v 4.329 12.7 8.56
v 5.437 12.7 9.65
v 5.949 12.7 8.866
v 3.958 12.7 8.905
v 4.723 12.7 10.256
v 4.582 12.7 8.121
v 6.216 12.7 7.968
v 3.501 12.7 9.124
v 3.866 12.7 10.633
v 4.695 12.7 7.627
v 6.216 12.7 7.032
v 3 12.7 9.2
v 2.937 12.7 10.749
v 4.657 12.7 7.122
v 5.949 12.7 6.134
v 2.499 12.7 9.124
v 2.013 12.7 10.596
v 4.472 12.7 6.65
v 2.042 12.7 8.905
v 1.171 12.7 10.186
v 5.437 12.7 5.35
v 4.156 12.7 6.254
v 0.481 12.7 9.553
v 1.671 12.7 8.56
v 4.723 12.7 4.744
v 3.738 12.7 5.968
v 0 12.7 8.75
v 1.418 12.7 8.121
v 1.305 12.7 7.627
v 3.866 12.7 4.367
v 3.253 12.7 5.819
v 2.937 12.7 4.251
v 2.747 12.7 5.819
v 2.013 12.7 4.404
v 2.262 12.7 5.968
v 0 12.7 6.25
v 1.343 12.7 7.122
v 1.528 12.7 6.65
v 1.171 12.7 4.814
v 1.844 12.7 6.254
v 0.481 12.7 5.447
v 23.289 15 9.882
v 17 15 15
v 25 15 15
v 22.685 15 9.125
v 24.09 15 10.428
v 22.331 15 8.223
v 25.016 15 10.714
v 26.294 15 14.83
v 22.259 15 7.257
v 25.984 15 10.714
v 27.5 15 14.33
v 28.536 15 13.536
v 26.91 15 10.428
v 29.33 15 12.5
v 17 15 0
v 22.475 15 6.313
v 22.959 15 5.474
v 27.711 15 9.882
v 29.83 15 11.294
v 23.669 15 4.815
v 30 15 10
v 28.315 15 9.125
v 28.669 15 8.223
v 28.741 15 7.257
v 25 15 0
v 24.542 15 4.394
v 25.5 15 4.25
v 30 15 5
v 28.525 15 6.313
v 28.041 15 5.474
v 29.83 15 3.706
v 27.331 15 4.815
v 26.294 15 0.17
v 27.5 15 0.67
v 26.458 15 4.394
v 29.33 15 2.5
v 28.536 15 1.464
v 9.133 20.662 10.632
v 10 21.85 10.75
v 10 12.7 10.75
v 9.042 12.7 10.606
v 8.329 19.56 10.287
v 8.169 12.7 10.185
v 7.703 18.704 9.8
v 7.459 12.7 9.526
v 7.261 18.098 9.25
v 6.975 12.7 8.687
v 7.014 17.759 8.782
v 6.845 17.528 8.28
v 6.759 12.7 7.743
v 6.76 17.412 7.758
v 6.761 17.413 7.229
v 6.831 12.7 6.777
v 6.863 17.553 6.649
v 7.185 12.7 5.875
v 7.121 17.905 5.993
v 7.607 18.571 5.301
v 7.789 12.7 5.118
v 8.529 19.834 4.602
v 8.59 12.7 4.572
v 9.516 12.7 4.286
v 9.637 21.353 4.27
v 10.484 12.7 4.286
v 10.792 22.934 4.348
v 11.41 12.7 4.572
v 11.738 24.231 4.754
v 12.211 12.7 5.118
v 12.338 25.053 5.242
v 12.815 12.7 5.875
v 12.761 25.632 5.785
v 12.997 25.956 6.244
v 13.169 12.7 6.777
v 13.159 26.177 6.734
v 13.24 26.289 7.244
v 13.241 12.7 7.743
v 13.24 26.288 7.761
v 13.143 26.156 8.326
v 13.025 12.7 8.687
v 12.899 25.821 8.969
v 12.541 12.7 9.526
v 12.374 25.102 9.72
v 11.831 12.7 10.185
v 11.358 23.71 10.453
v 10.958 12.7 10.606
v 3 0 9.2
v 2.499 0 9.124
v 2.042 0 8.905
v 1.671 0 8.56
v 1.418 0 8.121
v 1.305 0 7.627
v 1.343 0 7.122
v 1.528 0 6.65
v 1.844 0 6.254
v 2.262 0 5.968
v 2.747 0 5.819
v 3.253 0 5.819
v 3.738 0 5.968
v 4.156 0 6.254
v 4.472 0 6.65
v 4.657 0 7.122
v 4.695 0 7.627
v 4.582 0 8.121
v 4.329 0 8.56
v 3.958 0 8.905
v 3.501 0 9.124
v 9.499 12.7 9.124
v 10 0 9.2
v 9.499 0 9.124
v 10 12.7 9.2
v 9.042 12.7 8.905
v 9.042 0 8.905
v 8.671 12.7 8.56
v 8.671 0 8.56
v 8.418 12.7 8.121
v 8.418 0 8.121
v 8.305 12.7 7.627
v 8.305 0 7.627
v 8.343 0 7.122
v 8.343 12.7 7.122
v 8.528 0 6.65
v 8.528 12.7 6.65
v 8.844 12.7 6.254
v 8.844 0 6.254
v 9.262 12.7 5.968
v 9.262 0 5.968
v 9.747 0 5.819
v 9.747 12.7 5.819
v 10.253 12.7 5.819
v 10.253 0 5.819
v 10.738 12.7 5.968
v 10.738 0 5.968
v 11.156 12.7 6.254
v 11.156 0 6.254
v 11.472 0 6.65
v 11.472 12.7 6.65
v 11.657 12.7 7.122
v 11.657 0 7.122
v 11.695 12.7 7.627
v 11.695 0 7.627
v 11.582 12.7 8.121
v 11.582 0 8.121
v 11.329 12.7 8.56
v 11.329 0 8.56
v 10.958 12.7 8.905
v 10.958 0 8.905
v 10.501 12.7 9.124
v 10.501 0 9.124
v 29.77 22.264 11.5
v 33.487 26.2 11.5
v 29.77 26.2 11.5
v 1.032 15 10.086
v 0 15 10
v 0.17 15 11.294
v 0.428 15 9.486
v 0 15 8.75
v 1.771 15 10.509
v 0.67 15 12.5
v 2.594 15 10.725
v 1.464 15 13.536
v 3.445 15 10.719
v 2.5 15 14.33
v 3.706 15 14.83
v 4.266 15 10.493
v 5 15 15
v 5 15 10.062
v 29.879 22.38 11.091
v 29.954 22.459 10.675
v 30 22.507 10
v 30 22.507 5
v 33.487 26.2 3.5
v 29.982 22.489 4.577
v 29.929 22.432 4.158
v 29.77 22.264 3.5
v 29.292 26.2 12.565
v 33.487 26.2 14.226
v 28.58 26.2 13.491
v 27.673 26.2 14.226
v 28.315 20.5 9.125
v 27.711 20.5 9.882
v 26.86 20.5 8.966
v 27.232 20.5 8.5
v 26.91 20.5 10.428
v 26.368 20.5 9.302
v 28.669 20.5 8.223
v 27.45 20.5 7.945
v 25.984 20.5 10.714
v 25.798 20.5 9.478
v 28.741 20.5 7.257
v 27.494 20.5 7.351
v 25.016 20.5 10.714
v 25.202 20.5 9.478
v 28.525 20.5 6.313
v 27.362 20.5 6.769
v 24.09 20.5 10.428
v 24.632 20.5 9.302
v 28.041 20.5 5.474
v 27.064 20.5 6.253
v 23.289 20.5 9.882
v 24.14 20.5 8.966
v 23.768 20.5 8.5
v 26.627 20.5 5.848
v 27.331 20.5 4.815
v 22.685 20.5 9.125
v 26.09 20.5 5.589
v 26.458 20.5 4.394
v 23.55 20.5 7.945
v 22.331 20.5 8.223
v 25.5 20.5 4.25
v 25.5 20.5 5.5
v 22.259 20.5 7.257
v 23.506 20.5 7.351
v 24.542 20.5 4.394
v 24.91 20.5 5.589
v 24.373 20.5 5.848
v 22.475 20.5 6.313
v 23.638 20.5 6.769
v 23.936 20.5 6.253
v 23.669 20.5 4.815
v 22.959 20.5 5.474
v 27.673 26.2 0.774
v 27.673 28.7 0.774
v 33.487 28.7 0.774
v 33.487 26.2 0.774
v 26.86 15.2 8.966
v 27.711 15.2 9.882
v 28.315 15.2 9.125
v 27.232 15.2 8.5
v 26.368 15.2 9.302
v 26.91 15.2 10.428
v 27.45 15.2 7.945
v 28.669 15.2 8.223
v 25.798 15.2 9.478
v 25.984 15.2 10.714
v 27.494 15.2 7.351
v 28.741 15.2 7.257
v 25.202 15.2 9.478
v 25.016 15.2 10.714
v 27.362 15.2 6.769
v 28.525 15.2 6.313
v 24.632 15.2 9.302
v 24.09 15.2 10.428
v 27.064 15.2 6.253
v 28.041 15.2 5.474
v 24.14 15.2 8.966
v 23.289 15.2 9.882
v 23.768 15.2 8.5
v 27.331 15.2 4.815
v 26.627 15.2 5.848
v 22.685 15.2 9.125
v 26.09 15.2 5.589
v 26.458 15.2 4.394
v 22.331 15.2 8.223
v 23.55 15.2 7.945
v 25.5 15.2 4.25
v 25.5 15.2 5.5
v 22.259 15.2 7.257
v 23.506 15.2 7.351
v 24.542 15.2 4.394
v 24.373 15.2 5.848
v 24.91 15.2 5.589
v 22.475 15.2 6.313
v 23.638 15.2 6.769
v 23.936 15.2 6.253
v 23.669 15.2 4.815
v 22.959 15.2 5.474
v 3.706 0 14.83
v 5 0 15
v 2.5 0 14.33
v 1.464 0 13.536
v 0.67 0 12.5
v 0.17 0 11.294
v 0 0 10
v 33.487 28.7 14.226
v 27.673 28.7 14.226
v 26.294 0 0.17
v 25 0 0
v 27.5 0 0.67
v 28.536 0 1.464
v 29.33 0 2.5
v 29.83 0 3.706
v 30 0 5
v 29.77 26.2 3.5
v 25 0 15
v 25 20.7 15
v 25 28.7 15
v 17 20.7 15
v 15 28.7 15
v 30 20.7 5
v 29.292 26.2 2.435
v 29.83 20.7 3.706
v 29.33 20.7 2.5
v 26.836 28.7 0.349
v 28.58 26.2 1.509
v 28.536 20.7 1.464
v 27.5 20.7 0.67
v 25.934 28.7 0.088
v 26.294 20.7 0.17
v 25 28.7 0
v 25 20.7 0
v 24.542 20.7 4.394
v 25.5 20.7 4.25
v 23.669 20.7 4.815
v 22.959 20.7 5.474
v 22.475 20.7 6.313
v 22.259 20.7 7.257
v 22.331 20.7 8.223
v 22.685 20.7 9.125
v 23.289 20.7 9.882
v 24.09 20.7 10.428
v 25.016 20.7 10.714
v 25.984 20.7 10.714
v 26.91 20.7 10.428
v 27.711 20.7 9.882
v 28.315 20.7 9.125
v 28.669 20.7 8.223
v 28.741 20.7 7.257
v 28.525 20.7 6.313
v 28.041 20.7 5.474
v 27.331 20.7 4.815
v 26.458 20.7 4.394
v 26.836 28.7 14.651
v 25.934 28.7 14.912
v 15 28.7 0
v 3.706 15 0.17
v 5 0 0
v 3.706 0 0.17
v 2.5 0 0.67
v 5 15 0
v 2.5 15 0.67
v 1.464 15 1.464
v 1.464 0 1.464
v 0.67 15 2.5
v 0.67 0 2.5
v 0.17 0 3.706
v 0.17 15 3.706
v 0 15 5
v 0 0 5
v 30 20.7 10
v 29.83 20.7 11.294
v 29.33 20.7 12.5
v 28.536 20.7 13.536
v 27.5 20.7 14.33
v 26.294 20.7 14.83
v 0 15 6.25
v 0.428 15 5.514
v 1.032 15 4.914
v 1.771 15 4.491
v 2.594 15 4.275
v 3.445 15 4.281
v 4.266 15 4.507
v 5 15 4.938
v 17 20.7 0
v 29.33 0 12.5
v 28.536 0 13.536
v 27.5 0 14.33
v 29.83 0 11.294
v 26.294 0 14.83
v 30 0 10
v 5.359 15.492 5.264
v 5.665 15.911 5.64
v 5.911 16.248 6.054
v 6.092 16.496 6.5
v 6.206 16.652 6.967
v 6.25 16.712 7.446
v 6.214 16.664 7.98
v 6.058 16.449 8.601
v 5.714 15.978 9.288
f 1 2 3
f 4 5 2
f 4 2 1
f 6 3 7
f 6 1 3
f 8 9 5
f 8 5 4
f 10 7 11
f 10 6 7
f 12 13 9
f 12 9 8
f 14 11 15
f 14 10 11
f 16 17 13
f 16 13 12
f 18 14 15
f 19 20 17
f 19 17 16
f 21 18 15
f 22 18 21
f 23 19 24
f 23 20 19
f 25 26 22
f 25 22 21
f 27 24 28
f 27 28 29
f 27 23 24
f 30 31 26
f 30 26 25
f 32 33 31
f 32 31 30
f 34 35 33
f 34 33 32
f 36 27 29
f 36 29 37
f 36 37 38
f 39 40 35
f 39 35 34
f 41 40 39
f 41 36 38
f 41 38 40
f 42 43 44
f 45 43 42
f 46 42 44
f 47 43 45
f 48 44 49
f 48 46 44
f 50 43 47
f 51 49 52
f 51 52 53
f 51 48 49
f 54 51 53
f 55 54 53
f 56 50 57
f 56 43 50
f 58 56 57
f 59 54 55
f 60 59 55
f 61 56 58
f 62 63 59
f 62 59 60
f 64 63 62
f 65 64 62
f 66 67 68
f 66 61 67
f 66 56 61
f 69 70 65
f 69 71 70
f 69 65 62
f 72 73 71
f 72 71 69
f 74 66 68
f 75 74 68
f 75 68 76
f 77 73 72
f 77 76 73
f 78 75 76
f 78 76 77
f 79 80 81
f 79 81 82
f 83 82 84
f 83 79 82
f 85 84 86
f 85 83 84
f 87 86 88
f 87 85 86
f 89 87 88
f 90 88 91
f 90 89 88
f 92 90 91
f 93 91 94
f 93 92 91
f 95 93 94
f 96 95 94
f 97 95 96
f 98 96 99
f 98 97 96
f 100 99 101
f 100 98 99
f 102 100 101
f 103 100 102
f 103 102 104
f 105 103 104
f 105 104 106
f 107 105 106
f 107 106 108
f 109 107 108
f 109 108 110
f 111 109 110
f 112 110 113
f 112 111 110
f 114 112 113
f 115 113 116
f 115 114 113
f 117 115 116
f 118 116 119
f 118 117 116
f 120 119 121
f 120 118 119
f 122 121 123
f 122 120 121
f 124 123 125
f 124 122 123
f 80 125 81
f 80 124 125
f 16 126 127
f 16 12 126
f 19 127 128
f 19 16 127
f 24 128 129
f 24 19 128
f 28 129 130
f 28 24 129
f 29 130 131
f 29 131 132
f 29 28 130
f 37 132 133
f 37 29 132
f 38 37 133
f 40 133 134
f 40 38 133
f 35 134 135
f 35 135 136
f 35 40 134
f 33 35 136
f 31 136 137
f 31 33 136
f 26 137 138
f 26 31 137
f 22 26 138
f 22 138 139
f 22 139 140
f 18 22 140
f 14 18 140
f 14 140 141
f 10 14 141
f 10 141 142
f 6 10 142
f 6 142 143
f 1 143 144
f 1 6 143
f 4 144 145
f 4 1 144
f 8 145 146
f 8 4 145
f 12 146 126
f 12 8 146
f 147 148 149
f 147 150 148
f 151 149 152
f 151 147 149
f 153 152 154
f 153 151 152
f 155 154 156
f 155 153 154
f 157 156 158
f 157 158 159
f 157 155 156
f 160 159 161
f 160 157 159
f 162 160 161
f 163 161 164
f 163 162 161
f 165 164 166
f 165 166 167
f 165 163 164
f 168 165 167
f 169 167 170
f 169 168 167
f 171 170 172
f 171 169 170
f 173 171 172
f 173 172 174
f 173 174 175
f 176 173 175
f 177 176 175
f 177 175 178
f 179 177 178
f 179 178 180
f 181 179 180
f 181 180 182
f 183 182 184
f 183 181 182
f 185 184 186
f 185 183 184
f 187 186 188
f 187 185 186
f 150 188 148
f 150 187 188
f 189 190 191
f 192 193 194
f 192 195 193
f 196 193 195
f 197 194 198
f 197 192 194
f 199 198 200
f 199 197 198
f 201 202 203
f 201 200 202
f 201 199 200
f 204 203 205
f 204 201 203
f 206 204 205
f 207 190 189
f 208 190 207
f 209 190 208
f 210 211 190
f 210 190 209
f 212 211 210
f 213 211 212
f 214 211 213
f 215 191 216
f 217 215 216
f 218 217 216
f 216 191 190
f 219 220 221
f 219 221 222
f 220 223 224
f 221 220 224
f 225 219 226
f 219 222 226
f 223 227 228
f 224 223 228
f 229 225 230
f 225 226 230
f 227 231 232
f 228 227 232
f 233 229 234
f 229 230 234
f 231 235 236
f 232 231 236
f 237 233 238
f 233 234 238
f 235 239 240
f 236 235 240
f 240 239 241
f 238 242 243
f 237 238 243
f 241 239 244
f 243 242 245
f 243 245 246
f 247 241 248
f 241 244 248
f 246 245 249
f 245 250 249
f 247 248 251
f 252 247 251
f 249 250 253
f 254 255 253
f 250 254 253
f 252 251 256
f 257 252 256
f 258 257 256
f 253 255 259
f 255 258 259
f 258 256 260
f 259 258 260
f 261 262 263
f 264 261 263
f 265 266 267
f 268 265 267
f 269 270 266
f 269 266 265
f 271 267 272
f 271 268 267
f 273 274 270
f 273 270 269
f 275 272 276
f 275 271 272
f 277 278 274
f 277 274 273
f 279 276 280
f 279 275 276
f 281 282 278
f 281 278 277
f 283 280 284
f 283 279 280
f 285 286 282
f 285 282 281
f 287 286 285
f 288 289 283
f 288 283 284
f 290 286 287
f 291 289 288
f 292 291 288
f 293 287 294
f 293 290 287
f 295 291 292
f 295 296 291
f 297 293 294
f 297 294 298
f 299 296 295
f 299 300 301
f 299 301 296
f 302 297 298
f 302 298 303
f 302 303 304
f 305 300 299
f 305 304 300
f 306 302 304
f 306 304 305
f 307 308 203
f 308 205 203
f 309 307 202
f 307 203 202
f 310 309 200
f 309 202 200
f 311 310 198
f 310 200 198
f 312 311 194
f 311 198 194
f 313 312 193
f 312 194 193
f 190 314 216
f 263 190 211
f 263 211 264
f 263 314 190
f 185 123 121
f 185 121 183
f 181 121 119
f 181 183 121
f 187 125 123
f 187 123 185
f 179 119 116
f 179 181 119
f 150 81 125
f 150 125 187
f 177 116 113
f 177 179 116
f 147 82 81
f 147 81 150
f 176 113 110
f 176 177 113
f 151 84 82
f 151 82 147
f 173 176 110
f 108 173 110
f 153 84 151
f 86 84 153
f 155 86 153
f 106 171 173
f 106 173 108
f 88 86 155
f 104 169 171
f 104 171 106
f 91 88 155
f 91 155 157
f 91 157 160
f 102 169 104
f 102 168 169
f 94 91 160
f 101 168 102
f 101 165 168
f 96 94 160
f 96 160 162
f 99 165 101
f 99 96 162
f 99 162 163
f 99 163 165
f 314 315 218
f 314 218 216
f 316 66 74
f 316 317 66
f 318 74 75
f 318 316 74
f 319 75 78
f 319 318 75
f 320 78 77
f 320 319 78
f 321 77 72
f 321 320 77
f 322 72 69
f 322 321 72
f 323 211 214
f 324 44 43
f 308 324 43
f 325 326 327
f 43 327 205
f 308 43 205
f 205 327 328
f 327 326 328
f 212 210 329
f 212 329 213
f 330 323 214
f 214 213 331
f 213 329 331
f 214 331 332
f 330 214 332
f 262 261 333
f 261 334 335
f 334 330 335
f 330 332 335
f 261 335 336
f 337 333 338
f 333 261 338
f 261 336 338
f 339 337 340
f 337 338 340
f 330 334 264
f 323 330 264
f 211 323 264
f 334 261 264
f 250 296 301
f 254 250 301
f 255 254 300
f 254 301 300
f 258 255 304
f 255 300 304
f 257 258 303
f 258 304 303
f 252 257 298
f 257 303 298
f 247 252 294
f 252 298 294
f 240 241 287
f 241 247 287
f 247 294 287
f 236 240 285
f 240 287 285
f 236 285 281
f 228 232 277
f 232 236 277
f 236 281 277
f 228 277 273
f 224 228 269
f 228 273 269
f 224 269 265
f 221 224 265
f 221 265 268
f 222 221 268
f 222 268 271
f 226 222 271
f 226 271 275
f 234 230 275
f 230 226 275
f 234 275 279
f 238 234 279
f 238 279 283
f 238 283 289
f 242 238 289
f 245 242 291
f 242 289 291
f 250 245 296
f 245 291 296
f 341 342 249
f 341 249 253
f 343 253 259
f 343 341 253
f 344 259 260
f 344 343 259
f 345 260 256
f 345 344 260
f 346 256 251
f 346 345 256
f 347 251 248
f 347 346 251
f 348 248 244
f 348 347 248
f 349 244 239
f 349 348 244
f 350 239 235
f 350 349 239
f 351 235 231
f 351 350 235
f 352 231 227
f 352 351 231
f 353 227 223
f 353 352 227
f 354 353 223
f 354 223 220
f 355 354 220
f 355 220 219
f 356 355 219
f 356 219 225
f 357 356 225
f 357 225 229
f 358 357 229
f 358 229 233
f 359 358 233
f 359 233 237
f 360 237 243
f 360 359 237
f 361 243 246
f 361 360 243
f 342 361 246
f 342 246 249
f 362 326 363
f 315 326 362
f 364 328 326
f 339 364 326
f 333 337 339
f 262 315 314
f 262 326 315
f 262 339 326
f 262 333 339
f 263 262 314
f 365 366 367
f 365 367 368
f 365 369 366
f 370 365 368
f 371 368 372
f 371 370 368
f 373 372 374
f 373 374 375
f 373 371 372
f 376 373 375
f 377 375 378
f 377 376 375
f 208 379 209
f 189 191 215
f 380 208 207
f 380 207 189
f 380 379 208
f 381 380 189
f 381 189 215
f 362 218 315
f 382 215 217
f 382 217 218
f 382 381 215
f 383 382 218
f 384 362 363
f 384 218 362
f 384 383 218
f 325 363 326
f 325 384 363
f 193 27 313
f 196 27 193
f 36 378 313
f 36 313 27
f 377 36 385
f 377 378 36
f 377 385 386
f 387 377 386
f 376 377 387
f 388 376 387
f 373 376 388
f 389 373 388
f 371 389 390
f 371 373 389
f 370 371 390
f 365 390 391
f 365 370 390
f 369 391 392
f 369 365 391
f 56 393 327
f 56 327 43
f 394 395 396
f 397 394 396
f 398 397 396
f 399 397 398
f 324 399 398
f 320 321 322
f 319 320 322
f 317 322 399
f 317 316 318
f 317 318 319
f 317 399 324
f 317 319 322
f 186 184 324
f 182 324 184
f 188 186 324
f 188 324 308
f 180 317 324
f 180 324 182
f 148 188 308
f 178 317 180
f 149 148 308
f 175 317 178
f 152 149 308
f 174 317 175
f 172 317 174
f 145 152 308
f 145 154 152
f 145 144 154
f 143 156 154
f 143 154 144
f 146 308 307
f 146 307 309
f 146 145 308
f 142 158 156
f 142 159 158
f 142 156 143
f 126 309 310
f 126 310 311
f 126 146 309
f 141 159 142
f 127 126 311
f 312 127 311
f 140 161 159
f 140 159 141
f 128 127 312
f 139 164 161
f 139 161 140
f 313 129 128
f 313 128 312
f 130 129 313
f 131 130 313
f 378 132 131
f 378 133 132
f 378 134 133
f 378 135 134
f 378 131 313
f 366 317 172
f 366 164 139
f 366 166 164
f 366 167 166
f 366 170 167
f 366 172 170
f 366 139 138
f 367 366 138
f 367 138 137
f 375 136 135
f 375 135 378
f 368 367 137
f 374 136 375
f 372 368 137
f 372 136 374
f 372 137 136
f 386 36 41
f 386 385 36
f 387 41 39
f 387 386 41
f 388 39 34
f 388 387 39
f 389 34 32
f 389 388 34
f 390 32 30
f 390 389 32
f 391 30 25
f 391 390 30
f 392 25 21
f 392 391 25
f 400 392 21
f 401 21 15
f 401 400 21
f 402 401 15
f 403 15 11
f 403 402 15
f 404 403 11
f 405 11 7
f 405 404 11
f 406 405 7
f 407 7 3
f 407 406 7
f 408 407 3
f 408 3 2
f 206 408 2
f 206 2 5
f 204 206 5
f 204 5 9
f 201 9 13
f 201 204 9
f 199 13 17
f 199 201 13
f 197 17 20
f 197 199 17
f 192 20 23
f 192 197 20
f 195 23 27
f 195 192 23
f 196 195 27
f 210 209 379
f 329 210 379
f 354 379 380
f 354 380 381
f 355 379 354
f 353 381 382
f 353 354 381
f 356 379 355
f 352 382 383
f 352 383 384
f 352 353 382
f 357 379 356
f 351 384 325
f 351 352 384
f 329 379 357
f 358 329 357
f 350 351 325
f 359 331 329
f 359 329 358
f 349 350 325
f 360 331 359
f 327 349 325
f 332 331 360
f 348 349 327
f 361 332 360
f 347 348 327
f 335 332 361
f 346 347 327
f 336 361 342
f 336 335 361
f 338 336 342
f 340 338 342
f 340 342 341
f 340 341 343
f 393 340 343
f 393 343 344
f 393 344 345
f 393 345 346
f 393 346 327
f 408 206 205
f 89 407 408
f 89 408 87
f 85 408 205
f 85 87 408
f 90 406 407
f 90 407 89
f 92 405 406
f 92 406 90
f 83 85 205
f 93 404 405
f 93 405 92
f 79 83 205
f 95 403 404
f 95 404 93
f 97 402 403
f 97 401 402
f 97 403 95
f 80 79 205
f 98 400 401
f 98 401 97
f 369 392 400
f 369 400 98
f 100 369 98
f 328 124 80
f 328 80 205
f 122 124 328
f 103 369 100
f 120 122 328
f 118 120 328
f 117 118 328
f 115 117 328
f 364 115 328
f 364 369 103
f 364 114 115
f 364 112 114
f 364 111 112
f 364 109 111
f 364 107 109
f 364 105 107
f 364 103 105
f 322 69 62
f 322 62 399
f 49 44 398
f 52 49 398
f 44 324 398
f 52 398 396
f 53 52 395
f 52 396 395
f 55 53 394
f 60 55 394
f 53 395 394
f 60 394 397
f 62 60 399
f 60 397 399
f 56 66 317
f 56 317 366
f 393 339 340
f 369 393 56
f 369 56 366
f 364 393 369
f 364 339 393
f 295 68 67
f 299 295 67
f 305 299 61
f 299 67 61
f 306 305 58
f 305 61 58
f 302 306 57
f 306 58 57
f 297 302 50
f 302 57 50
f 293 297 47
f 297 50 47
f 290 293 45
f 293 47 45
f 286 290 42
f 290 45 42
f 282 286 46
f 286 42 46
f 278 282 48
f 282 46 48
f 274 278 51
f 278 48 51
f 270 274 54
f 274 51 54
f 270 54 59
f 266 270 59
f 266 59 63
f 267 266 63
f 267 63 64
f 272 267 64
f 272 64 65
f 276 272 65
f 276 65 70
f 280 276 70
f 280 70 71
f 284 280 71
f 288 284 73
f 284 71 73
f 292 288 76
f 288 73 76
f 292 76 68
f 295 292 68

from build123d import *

# Parameters (mm, degrees)
BOSS_EXTRUDE1_DEPTH           = 15
BOSS_EXTRUDE2_REACH           = 38.742
SKETCH3_R                     = 2
SKETCH4_R                     = 3.25
BOSS_EXTRUDE3_DEPTH           = 0.2
FILLET1_R                     = 5
CBORE_FOR_M3_SHCS1_AT_2_COUNT = 2
CBORE_FOR_M3_SHCS1_AT_2_PITCH = 7
SKETCH7_W                     = 5.814312221
SKETCH7_H                     = 13.45156011
BOSS_EXTRUDE4_DEPTH           = 2.5
RIB1_REACH                    = 46.736
SKETCH9_WALL_W                = 96.550792296
SKETCH9_WALL_H                = 8


with BuildPart() as part:
    # Sketch1 → Boss-Extrude1 (new body)
    with BuildSketch(Plane.XY):
        Polygon((0, 0), (0, 15), (5, 15), (15, 28.7), (30, 28.7), (30, 20.7), (17, 20.7), (17, 15), (30, 15), (30, 0), align=None)
    extrude(amount=BOSS_EXTRUDE1_DEPTH)

    # Sketch3 → Boss-Extrude2 (add, up to next)
    with BuildSketch(Plane(origin=(0, 15, 0), x_dir=(1, 0, 0), z_dir=(0, 1, 0)), mode=Mode.PRIVATE) as boss_extrude2_sk1:
        with Locations(Location((25.5, -7.5, 0), (0, 0, 90))):
            Circle(SKETCH3_R)
    boss_extrude2_tool1 = extrude(boss_extrude2_sk1.sketch, amount=BOSS_EXTRUDE2_REACH, mode=Mode.PRIVATE) - part.part
    add(boss_extrude2_tool1.solids().sort_by_distance((25.5, 15, 7.5))[0])

    # Sketch4 → Boss-Extrude3 (add)
    with BuildSketch(Plane(origin=(0, 15, 0), x_dir=(1, 0, 0), z_dir=(0, 1, 0))):
        with Locations(Location((25.5, -7.5, 0), (0, 0, 90))):
            Circle(SKETCH4_R)
    boss_extrude3 = extrude(amount=BOSS_EXTRUDE3_DEPTH)

    # Mirror1: Boss-Extrude3 across plane
    add(boss_extrude3.mirror(Plane.ZX.offset(17.85)))

    # Fillet1
    fillet1_edges = [part.edges().sort_by_distance(p)[0] for p in [
        (0, 7.5, 0),
        (30, 24.7, 0),
        (30, 7.5, 0),
        (30, 24.7, 15),
        (0, 7.5, 15),
        (30, 7.5, 15),
    ]]
    fillet(fillet1_edges, radius=FILLET1_R)

    # Sketch6 → CBORE for M3 SHCS1 (revolve, cut)
    with BuildSketch(Plane(origin=(3, 28.7, 7.5), x_dir=(0, 0, 1), z_dir=(1, 0, 0))):
        Polygon((0, 0), (0, 28.7), (1.7, 28.7), (1.7, 16), (3.25, 16), (3.25, 0.025), (3.275, 0), align=None)
    cbore_for_m3_shcs1 = revolve(axis=Axis((3, 35.05, 7.5), (0, -1, 0)), mode=Mode.SUBTRACT)

    # CBORE for M3 SHCS1 at 2: CBORE for M3 SHCS1 ×2
    with Locations(*[(i * CBORE_FOR_M3_SHCS1_AT_2_PITCH, 0, 0) for i in range(1, CBORE_FOR_M3_SHCS1_AT_2_COUNT)]):
        add(cbore_for_m3_shcs1, mode=Mode.SUBTRACT)

    # Sketch7 → Boss-Extrude4 (add)
    with BuildSketch(Plane(origin=(0, 28.7, 0), x_dir=(1, 0, 0), z_dir=(0, 1, 0))):
        with Locations((30.579754646, -7.5)):
            Rectangle(SKETCH7_W, SKETCH7_H)
    extrude(amount=-BOSS_EXTRUDE4_DEPTH)

    # Sketch9 wall → Rib1 (add, up to next)
    with BuildSketch(Plane(origin=(31.743455378, 24.353734121, 7.5), x_dir=(-0.686573540745, -0.727060364171, 0), z_dir=(0.727060364171, -0.686573540745, 0)), mode=Mode.PRIVATE) as rib1_sk1:
        Rectangle(SKETCH9_WALL_W, SKETCH9_WALL_H)
    rib1_tool1 = extrude(rib1_sk1.sketch, amount=-RIB1_REACH, mode=Mode.PRIVATE) - part.part
    add(rib1_tool1.solids().sort_by_distance((31.743455378, 24.353734121, 7.5))[0])


solid = part.part
